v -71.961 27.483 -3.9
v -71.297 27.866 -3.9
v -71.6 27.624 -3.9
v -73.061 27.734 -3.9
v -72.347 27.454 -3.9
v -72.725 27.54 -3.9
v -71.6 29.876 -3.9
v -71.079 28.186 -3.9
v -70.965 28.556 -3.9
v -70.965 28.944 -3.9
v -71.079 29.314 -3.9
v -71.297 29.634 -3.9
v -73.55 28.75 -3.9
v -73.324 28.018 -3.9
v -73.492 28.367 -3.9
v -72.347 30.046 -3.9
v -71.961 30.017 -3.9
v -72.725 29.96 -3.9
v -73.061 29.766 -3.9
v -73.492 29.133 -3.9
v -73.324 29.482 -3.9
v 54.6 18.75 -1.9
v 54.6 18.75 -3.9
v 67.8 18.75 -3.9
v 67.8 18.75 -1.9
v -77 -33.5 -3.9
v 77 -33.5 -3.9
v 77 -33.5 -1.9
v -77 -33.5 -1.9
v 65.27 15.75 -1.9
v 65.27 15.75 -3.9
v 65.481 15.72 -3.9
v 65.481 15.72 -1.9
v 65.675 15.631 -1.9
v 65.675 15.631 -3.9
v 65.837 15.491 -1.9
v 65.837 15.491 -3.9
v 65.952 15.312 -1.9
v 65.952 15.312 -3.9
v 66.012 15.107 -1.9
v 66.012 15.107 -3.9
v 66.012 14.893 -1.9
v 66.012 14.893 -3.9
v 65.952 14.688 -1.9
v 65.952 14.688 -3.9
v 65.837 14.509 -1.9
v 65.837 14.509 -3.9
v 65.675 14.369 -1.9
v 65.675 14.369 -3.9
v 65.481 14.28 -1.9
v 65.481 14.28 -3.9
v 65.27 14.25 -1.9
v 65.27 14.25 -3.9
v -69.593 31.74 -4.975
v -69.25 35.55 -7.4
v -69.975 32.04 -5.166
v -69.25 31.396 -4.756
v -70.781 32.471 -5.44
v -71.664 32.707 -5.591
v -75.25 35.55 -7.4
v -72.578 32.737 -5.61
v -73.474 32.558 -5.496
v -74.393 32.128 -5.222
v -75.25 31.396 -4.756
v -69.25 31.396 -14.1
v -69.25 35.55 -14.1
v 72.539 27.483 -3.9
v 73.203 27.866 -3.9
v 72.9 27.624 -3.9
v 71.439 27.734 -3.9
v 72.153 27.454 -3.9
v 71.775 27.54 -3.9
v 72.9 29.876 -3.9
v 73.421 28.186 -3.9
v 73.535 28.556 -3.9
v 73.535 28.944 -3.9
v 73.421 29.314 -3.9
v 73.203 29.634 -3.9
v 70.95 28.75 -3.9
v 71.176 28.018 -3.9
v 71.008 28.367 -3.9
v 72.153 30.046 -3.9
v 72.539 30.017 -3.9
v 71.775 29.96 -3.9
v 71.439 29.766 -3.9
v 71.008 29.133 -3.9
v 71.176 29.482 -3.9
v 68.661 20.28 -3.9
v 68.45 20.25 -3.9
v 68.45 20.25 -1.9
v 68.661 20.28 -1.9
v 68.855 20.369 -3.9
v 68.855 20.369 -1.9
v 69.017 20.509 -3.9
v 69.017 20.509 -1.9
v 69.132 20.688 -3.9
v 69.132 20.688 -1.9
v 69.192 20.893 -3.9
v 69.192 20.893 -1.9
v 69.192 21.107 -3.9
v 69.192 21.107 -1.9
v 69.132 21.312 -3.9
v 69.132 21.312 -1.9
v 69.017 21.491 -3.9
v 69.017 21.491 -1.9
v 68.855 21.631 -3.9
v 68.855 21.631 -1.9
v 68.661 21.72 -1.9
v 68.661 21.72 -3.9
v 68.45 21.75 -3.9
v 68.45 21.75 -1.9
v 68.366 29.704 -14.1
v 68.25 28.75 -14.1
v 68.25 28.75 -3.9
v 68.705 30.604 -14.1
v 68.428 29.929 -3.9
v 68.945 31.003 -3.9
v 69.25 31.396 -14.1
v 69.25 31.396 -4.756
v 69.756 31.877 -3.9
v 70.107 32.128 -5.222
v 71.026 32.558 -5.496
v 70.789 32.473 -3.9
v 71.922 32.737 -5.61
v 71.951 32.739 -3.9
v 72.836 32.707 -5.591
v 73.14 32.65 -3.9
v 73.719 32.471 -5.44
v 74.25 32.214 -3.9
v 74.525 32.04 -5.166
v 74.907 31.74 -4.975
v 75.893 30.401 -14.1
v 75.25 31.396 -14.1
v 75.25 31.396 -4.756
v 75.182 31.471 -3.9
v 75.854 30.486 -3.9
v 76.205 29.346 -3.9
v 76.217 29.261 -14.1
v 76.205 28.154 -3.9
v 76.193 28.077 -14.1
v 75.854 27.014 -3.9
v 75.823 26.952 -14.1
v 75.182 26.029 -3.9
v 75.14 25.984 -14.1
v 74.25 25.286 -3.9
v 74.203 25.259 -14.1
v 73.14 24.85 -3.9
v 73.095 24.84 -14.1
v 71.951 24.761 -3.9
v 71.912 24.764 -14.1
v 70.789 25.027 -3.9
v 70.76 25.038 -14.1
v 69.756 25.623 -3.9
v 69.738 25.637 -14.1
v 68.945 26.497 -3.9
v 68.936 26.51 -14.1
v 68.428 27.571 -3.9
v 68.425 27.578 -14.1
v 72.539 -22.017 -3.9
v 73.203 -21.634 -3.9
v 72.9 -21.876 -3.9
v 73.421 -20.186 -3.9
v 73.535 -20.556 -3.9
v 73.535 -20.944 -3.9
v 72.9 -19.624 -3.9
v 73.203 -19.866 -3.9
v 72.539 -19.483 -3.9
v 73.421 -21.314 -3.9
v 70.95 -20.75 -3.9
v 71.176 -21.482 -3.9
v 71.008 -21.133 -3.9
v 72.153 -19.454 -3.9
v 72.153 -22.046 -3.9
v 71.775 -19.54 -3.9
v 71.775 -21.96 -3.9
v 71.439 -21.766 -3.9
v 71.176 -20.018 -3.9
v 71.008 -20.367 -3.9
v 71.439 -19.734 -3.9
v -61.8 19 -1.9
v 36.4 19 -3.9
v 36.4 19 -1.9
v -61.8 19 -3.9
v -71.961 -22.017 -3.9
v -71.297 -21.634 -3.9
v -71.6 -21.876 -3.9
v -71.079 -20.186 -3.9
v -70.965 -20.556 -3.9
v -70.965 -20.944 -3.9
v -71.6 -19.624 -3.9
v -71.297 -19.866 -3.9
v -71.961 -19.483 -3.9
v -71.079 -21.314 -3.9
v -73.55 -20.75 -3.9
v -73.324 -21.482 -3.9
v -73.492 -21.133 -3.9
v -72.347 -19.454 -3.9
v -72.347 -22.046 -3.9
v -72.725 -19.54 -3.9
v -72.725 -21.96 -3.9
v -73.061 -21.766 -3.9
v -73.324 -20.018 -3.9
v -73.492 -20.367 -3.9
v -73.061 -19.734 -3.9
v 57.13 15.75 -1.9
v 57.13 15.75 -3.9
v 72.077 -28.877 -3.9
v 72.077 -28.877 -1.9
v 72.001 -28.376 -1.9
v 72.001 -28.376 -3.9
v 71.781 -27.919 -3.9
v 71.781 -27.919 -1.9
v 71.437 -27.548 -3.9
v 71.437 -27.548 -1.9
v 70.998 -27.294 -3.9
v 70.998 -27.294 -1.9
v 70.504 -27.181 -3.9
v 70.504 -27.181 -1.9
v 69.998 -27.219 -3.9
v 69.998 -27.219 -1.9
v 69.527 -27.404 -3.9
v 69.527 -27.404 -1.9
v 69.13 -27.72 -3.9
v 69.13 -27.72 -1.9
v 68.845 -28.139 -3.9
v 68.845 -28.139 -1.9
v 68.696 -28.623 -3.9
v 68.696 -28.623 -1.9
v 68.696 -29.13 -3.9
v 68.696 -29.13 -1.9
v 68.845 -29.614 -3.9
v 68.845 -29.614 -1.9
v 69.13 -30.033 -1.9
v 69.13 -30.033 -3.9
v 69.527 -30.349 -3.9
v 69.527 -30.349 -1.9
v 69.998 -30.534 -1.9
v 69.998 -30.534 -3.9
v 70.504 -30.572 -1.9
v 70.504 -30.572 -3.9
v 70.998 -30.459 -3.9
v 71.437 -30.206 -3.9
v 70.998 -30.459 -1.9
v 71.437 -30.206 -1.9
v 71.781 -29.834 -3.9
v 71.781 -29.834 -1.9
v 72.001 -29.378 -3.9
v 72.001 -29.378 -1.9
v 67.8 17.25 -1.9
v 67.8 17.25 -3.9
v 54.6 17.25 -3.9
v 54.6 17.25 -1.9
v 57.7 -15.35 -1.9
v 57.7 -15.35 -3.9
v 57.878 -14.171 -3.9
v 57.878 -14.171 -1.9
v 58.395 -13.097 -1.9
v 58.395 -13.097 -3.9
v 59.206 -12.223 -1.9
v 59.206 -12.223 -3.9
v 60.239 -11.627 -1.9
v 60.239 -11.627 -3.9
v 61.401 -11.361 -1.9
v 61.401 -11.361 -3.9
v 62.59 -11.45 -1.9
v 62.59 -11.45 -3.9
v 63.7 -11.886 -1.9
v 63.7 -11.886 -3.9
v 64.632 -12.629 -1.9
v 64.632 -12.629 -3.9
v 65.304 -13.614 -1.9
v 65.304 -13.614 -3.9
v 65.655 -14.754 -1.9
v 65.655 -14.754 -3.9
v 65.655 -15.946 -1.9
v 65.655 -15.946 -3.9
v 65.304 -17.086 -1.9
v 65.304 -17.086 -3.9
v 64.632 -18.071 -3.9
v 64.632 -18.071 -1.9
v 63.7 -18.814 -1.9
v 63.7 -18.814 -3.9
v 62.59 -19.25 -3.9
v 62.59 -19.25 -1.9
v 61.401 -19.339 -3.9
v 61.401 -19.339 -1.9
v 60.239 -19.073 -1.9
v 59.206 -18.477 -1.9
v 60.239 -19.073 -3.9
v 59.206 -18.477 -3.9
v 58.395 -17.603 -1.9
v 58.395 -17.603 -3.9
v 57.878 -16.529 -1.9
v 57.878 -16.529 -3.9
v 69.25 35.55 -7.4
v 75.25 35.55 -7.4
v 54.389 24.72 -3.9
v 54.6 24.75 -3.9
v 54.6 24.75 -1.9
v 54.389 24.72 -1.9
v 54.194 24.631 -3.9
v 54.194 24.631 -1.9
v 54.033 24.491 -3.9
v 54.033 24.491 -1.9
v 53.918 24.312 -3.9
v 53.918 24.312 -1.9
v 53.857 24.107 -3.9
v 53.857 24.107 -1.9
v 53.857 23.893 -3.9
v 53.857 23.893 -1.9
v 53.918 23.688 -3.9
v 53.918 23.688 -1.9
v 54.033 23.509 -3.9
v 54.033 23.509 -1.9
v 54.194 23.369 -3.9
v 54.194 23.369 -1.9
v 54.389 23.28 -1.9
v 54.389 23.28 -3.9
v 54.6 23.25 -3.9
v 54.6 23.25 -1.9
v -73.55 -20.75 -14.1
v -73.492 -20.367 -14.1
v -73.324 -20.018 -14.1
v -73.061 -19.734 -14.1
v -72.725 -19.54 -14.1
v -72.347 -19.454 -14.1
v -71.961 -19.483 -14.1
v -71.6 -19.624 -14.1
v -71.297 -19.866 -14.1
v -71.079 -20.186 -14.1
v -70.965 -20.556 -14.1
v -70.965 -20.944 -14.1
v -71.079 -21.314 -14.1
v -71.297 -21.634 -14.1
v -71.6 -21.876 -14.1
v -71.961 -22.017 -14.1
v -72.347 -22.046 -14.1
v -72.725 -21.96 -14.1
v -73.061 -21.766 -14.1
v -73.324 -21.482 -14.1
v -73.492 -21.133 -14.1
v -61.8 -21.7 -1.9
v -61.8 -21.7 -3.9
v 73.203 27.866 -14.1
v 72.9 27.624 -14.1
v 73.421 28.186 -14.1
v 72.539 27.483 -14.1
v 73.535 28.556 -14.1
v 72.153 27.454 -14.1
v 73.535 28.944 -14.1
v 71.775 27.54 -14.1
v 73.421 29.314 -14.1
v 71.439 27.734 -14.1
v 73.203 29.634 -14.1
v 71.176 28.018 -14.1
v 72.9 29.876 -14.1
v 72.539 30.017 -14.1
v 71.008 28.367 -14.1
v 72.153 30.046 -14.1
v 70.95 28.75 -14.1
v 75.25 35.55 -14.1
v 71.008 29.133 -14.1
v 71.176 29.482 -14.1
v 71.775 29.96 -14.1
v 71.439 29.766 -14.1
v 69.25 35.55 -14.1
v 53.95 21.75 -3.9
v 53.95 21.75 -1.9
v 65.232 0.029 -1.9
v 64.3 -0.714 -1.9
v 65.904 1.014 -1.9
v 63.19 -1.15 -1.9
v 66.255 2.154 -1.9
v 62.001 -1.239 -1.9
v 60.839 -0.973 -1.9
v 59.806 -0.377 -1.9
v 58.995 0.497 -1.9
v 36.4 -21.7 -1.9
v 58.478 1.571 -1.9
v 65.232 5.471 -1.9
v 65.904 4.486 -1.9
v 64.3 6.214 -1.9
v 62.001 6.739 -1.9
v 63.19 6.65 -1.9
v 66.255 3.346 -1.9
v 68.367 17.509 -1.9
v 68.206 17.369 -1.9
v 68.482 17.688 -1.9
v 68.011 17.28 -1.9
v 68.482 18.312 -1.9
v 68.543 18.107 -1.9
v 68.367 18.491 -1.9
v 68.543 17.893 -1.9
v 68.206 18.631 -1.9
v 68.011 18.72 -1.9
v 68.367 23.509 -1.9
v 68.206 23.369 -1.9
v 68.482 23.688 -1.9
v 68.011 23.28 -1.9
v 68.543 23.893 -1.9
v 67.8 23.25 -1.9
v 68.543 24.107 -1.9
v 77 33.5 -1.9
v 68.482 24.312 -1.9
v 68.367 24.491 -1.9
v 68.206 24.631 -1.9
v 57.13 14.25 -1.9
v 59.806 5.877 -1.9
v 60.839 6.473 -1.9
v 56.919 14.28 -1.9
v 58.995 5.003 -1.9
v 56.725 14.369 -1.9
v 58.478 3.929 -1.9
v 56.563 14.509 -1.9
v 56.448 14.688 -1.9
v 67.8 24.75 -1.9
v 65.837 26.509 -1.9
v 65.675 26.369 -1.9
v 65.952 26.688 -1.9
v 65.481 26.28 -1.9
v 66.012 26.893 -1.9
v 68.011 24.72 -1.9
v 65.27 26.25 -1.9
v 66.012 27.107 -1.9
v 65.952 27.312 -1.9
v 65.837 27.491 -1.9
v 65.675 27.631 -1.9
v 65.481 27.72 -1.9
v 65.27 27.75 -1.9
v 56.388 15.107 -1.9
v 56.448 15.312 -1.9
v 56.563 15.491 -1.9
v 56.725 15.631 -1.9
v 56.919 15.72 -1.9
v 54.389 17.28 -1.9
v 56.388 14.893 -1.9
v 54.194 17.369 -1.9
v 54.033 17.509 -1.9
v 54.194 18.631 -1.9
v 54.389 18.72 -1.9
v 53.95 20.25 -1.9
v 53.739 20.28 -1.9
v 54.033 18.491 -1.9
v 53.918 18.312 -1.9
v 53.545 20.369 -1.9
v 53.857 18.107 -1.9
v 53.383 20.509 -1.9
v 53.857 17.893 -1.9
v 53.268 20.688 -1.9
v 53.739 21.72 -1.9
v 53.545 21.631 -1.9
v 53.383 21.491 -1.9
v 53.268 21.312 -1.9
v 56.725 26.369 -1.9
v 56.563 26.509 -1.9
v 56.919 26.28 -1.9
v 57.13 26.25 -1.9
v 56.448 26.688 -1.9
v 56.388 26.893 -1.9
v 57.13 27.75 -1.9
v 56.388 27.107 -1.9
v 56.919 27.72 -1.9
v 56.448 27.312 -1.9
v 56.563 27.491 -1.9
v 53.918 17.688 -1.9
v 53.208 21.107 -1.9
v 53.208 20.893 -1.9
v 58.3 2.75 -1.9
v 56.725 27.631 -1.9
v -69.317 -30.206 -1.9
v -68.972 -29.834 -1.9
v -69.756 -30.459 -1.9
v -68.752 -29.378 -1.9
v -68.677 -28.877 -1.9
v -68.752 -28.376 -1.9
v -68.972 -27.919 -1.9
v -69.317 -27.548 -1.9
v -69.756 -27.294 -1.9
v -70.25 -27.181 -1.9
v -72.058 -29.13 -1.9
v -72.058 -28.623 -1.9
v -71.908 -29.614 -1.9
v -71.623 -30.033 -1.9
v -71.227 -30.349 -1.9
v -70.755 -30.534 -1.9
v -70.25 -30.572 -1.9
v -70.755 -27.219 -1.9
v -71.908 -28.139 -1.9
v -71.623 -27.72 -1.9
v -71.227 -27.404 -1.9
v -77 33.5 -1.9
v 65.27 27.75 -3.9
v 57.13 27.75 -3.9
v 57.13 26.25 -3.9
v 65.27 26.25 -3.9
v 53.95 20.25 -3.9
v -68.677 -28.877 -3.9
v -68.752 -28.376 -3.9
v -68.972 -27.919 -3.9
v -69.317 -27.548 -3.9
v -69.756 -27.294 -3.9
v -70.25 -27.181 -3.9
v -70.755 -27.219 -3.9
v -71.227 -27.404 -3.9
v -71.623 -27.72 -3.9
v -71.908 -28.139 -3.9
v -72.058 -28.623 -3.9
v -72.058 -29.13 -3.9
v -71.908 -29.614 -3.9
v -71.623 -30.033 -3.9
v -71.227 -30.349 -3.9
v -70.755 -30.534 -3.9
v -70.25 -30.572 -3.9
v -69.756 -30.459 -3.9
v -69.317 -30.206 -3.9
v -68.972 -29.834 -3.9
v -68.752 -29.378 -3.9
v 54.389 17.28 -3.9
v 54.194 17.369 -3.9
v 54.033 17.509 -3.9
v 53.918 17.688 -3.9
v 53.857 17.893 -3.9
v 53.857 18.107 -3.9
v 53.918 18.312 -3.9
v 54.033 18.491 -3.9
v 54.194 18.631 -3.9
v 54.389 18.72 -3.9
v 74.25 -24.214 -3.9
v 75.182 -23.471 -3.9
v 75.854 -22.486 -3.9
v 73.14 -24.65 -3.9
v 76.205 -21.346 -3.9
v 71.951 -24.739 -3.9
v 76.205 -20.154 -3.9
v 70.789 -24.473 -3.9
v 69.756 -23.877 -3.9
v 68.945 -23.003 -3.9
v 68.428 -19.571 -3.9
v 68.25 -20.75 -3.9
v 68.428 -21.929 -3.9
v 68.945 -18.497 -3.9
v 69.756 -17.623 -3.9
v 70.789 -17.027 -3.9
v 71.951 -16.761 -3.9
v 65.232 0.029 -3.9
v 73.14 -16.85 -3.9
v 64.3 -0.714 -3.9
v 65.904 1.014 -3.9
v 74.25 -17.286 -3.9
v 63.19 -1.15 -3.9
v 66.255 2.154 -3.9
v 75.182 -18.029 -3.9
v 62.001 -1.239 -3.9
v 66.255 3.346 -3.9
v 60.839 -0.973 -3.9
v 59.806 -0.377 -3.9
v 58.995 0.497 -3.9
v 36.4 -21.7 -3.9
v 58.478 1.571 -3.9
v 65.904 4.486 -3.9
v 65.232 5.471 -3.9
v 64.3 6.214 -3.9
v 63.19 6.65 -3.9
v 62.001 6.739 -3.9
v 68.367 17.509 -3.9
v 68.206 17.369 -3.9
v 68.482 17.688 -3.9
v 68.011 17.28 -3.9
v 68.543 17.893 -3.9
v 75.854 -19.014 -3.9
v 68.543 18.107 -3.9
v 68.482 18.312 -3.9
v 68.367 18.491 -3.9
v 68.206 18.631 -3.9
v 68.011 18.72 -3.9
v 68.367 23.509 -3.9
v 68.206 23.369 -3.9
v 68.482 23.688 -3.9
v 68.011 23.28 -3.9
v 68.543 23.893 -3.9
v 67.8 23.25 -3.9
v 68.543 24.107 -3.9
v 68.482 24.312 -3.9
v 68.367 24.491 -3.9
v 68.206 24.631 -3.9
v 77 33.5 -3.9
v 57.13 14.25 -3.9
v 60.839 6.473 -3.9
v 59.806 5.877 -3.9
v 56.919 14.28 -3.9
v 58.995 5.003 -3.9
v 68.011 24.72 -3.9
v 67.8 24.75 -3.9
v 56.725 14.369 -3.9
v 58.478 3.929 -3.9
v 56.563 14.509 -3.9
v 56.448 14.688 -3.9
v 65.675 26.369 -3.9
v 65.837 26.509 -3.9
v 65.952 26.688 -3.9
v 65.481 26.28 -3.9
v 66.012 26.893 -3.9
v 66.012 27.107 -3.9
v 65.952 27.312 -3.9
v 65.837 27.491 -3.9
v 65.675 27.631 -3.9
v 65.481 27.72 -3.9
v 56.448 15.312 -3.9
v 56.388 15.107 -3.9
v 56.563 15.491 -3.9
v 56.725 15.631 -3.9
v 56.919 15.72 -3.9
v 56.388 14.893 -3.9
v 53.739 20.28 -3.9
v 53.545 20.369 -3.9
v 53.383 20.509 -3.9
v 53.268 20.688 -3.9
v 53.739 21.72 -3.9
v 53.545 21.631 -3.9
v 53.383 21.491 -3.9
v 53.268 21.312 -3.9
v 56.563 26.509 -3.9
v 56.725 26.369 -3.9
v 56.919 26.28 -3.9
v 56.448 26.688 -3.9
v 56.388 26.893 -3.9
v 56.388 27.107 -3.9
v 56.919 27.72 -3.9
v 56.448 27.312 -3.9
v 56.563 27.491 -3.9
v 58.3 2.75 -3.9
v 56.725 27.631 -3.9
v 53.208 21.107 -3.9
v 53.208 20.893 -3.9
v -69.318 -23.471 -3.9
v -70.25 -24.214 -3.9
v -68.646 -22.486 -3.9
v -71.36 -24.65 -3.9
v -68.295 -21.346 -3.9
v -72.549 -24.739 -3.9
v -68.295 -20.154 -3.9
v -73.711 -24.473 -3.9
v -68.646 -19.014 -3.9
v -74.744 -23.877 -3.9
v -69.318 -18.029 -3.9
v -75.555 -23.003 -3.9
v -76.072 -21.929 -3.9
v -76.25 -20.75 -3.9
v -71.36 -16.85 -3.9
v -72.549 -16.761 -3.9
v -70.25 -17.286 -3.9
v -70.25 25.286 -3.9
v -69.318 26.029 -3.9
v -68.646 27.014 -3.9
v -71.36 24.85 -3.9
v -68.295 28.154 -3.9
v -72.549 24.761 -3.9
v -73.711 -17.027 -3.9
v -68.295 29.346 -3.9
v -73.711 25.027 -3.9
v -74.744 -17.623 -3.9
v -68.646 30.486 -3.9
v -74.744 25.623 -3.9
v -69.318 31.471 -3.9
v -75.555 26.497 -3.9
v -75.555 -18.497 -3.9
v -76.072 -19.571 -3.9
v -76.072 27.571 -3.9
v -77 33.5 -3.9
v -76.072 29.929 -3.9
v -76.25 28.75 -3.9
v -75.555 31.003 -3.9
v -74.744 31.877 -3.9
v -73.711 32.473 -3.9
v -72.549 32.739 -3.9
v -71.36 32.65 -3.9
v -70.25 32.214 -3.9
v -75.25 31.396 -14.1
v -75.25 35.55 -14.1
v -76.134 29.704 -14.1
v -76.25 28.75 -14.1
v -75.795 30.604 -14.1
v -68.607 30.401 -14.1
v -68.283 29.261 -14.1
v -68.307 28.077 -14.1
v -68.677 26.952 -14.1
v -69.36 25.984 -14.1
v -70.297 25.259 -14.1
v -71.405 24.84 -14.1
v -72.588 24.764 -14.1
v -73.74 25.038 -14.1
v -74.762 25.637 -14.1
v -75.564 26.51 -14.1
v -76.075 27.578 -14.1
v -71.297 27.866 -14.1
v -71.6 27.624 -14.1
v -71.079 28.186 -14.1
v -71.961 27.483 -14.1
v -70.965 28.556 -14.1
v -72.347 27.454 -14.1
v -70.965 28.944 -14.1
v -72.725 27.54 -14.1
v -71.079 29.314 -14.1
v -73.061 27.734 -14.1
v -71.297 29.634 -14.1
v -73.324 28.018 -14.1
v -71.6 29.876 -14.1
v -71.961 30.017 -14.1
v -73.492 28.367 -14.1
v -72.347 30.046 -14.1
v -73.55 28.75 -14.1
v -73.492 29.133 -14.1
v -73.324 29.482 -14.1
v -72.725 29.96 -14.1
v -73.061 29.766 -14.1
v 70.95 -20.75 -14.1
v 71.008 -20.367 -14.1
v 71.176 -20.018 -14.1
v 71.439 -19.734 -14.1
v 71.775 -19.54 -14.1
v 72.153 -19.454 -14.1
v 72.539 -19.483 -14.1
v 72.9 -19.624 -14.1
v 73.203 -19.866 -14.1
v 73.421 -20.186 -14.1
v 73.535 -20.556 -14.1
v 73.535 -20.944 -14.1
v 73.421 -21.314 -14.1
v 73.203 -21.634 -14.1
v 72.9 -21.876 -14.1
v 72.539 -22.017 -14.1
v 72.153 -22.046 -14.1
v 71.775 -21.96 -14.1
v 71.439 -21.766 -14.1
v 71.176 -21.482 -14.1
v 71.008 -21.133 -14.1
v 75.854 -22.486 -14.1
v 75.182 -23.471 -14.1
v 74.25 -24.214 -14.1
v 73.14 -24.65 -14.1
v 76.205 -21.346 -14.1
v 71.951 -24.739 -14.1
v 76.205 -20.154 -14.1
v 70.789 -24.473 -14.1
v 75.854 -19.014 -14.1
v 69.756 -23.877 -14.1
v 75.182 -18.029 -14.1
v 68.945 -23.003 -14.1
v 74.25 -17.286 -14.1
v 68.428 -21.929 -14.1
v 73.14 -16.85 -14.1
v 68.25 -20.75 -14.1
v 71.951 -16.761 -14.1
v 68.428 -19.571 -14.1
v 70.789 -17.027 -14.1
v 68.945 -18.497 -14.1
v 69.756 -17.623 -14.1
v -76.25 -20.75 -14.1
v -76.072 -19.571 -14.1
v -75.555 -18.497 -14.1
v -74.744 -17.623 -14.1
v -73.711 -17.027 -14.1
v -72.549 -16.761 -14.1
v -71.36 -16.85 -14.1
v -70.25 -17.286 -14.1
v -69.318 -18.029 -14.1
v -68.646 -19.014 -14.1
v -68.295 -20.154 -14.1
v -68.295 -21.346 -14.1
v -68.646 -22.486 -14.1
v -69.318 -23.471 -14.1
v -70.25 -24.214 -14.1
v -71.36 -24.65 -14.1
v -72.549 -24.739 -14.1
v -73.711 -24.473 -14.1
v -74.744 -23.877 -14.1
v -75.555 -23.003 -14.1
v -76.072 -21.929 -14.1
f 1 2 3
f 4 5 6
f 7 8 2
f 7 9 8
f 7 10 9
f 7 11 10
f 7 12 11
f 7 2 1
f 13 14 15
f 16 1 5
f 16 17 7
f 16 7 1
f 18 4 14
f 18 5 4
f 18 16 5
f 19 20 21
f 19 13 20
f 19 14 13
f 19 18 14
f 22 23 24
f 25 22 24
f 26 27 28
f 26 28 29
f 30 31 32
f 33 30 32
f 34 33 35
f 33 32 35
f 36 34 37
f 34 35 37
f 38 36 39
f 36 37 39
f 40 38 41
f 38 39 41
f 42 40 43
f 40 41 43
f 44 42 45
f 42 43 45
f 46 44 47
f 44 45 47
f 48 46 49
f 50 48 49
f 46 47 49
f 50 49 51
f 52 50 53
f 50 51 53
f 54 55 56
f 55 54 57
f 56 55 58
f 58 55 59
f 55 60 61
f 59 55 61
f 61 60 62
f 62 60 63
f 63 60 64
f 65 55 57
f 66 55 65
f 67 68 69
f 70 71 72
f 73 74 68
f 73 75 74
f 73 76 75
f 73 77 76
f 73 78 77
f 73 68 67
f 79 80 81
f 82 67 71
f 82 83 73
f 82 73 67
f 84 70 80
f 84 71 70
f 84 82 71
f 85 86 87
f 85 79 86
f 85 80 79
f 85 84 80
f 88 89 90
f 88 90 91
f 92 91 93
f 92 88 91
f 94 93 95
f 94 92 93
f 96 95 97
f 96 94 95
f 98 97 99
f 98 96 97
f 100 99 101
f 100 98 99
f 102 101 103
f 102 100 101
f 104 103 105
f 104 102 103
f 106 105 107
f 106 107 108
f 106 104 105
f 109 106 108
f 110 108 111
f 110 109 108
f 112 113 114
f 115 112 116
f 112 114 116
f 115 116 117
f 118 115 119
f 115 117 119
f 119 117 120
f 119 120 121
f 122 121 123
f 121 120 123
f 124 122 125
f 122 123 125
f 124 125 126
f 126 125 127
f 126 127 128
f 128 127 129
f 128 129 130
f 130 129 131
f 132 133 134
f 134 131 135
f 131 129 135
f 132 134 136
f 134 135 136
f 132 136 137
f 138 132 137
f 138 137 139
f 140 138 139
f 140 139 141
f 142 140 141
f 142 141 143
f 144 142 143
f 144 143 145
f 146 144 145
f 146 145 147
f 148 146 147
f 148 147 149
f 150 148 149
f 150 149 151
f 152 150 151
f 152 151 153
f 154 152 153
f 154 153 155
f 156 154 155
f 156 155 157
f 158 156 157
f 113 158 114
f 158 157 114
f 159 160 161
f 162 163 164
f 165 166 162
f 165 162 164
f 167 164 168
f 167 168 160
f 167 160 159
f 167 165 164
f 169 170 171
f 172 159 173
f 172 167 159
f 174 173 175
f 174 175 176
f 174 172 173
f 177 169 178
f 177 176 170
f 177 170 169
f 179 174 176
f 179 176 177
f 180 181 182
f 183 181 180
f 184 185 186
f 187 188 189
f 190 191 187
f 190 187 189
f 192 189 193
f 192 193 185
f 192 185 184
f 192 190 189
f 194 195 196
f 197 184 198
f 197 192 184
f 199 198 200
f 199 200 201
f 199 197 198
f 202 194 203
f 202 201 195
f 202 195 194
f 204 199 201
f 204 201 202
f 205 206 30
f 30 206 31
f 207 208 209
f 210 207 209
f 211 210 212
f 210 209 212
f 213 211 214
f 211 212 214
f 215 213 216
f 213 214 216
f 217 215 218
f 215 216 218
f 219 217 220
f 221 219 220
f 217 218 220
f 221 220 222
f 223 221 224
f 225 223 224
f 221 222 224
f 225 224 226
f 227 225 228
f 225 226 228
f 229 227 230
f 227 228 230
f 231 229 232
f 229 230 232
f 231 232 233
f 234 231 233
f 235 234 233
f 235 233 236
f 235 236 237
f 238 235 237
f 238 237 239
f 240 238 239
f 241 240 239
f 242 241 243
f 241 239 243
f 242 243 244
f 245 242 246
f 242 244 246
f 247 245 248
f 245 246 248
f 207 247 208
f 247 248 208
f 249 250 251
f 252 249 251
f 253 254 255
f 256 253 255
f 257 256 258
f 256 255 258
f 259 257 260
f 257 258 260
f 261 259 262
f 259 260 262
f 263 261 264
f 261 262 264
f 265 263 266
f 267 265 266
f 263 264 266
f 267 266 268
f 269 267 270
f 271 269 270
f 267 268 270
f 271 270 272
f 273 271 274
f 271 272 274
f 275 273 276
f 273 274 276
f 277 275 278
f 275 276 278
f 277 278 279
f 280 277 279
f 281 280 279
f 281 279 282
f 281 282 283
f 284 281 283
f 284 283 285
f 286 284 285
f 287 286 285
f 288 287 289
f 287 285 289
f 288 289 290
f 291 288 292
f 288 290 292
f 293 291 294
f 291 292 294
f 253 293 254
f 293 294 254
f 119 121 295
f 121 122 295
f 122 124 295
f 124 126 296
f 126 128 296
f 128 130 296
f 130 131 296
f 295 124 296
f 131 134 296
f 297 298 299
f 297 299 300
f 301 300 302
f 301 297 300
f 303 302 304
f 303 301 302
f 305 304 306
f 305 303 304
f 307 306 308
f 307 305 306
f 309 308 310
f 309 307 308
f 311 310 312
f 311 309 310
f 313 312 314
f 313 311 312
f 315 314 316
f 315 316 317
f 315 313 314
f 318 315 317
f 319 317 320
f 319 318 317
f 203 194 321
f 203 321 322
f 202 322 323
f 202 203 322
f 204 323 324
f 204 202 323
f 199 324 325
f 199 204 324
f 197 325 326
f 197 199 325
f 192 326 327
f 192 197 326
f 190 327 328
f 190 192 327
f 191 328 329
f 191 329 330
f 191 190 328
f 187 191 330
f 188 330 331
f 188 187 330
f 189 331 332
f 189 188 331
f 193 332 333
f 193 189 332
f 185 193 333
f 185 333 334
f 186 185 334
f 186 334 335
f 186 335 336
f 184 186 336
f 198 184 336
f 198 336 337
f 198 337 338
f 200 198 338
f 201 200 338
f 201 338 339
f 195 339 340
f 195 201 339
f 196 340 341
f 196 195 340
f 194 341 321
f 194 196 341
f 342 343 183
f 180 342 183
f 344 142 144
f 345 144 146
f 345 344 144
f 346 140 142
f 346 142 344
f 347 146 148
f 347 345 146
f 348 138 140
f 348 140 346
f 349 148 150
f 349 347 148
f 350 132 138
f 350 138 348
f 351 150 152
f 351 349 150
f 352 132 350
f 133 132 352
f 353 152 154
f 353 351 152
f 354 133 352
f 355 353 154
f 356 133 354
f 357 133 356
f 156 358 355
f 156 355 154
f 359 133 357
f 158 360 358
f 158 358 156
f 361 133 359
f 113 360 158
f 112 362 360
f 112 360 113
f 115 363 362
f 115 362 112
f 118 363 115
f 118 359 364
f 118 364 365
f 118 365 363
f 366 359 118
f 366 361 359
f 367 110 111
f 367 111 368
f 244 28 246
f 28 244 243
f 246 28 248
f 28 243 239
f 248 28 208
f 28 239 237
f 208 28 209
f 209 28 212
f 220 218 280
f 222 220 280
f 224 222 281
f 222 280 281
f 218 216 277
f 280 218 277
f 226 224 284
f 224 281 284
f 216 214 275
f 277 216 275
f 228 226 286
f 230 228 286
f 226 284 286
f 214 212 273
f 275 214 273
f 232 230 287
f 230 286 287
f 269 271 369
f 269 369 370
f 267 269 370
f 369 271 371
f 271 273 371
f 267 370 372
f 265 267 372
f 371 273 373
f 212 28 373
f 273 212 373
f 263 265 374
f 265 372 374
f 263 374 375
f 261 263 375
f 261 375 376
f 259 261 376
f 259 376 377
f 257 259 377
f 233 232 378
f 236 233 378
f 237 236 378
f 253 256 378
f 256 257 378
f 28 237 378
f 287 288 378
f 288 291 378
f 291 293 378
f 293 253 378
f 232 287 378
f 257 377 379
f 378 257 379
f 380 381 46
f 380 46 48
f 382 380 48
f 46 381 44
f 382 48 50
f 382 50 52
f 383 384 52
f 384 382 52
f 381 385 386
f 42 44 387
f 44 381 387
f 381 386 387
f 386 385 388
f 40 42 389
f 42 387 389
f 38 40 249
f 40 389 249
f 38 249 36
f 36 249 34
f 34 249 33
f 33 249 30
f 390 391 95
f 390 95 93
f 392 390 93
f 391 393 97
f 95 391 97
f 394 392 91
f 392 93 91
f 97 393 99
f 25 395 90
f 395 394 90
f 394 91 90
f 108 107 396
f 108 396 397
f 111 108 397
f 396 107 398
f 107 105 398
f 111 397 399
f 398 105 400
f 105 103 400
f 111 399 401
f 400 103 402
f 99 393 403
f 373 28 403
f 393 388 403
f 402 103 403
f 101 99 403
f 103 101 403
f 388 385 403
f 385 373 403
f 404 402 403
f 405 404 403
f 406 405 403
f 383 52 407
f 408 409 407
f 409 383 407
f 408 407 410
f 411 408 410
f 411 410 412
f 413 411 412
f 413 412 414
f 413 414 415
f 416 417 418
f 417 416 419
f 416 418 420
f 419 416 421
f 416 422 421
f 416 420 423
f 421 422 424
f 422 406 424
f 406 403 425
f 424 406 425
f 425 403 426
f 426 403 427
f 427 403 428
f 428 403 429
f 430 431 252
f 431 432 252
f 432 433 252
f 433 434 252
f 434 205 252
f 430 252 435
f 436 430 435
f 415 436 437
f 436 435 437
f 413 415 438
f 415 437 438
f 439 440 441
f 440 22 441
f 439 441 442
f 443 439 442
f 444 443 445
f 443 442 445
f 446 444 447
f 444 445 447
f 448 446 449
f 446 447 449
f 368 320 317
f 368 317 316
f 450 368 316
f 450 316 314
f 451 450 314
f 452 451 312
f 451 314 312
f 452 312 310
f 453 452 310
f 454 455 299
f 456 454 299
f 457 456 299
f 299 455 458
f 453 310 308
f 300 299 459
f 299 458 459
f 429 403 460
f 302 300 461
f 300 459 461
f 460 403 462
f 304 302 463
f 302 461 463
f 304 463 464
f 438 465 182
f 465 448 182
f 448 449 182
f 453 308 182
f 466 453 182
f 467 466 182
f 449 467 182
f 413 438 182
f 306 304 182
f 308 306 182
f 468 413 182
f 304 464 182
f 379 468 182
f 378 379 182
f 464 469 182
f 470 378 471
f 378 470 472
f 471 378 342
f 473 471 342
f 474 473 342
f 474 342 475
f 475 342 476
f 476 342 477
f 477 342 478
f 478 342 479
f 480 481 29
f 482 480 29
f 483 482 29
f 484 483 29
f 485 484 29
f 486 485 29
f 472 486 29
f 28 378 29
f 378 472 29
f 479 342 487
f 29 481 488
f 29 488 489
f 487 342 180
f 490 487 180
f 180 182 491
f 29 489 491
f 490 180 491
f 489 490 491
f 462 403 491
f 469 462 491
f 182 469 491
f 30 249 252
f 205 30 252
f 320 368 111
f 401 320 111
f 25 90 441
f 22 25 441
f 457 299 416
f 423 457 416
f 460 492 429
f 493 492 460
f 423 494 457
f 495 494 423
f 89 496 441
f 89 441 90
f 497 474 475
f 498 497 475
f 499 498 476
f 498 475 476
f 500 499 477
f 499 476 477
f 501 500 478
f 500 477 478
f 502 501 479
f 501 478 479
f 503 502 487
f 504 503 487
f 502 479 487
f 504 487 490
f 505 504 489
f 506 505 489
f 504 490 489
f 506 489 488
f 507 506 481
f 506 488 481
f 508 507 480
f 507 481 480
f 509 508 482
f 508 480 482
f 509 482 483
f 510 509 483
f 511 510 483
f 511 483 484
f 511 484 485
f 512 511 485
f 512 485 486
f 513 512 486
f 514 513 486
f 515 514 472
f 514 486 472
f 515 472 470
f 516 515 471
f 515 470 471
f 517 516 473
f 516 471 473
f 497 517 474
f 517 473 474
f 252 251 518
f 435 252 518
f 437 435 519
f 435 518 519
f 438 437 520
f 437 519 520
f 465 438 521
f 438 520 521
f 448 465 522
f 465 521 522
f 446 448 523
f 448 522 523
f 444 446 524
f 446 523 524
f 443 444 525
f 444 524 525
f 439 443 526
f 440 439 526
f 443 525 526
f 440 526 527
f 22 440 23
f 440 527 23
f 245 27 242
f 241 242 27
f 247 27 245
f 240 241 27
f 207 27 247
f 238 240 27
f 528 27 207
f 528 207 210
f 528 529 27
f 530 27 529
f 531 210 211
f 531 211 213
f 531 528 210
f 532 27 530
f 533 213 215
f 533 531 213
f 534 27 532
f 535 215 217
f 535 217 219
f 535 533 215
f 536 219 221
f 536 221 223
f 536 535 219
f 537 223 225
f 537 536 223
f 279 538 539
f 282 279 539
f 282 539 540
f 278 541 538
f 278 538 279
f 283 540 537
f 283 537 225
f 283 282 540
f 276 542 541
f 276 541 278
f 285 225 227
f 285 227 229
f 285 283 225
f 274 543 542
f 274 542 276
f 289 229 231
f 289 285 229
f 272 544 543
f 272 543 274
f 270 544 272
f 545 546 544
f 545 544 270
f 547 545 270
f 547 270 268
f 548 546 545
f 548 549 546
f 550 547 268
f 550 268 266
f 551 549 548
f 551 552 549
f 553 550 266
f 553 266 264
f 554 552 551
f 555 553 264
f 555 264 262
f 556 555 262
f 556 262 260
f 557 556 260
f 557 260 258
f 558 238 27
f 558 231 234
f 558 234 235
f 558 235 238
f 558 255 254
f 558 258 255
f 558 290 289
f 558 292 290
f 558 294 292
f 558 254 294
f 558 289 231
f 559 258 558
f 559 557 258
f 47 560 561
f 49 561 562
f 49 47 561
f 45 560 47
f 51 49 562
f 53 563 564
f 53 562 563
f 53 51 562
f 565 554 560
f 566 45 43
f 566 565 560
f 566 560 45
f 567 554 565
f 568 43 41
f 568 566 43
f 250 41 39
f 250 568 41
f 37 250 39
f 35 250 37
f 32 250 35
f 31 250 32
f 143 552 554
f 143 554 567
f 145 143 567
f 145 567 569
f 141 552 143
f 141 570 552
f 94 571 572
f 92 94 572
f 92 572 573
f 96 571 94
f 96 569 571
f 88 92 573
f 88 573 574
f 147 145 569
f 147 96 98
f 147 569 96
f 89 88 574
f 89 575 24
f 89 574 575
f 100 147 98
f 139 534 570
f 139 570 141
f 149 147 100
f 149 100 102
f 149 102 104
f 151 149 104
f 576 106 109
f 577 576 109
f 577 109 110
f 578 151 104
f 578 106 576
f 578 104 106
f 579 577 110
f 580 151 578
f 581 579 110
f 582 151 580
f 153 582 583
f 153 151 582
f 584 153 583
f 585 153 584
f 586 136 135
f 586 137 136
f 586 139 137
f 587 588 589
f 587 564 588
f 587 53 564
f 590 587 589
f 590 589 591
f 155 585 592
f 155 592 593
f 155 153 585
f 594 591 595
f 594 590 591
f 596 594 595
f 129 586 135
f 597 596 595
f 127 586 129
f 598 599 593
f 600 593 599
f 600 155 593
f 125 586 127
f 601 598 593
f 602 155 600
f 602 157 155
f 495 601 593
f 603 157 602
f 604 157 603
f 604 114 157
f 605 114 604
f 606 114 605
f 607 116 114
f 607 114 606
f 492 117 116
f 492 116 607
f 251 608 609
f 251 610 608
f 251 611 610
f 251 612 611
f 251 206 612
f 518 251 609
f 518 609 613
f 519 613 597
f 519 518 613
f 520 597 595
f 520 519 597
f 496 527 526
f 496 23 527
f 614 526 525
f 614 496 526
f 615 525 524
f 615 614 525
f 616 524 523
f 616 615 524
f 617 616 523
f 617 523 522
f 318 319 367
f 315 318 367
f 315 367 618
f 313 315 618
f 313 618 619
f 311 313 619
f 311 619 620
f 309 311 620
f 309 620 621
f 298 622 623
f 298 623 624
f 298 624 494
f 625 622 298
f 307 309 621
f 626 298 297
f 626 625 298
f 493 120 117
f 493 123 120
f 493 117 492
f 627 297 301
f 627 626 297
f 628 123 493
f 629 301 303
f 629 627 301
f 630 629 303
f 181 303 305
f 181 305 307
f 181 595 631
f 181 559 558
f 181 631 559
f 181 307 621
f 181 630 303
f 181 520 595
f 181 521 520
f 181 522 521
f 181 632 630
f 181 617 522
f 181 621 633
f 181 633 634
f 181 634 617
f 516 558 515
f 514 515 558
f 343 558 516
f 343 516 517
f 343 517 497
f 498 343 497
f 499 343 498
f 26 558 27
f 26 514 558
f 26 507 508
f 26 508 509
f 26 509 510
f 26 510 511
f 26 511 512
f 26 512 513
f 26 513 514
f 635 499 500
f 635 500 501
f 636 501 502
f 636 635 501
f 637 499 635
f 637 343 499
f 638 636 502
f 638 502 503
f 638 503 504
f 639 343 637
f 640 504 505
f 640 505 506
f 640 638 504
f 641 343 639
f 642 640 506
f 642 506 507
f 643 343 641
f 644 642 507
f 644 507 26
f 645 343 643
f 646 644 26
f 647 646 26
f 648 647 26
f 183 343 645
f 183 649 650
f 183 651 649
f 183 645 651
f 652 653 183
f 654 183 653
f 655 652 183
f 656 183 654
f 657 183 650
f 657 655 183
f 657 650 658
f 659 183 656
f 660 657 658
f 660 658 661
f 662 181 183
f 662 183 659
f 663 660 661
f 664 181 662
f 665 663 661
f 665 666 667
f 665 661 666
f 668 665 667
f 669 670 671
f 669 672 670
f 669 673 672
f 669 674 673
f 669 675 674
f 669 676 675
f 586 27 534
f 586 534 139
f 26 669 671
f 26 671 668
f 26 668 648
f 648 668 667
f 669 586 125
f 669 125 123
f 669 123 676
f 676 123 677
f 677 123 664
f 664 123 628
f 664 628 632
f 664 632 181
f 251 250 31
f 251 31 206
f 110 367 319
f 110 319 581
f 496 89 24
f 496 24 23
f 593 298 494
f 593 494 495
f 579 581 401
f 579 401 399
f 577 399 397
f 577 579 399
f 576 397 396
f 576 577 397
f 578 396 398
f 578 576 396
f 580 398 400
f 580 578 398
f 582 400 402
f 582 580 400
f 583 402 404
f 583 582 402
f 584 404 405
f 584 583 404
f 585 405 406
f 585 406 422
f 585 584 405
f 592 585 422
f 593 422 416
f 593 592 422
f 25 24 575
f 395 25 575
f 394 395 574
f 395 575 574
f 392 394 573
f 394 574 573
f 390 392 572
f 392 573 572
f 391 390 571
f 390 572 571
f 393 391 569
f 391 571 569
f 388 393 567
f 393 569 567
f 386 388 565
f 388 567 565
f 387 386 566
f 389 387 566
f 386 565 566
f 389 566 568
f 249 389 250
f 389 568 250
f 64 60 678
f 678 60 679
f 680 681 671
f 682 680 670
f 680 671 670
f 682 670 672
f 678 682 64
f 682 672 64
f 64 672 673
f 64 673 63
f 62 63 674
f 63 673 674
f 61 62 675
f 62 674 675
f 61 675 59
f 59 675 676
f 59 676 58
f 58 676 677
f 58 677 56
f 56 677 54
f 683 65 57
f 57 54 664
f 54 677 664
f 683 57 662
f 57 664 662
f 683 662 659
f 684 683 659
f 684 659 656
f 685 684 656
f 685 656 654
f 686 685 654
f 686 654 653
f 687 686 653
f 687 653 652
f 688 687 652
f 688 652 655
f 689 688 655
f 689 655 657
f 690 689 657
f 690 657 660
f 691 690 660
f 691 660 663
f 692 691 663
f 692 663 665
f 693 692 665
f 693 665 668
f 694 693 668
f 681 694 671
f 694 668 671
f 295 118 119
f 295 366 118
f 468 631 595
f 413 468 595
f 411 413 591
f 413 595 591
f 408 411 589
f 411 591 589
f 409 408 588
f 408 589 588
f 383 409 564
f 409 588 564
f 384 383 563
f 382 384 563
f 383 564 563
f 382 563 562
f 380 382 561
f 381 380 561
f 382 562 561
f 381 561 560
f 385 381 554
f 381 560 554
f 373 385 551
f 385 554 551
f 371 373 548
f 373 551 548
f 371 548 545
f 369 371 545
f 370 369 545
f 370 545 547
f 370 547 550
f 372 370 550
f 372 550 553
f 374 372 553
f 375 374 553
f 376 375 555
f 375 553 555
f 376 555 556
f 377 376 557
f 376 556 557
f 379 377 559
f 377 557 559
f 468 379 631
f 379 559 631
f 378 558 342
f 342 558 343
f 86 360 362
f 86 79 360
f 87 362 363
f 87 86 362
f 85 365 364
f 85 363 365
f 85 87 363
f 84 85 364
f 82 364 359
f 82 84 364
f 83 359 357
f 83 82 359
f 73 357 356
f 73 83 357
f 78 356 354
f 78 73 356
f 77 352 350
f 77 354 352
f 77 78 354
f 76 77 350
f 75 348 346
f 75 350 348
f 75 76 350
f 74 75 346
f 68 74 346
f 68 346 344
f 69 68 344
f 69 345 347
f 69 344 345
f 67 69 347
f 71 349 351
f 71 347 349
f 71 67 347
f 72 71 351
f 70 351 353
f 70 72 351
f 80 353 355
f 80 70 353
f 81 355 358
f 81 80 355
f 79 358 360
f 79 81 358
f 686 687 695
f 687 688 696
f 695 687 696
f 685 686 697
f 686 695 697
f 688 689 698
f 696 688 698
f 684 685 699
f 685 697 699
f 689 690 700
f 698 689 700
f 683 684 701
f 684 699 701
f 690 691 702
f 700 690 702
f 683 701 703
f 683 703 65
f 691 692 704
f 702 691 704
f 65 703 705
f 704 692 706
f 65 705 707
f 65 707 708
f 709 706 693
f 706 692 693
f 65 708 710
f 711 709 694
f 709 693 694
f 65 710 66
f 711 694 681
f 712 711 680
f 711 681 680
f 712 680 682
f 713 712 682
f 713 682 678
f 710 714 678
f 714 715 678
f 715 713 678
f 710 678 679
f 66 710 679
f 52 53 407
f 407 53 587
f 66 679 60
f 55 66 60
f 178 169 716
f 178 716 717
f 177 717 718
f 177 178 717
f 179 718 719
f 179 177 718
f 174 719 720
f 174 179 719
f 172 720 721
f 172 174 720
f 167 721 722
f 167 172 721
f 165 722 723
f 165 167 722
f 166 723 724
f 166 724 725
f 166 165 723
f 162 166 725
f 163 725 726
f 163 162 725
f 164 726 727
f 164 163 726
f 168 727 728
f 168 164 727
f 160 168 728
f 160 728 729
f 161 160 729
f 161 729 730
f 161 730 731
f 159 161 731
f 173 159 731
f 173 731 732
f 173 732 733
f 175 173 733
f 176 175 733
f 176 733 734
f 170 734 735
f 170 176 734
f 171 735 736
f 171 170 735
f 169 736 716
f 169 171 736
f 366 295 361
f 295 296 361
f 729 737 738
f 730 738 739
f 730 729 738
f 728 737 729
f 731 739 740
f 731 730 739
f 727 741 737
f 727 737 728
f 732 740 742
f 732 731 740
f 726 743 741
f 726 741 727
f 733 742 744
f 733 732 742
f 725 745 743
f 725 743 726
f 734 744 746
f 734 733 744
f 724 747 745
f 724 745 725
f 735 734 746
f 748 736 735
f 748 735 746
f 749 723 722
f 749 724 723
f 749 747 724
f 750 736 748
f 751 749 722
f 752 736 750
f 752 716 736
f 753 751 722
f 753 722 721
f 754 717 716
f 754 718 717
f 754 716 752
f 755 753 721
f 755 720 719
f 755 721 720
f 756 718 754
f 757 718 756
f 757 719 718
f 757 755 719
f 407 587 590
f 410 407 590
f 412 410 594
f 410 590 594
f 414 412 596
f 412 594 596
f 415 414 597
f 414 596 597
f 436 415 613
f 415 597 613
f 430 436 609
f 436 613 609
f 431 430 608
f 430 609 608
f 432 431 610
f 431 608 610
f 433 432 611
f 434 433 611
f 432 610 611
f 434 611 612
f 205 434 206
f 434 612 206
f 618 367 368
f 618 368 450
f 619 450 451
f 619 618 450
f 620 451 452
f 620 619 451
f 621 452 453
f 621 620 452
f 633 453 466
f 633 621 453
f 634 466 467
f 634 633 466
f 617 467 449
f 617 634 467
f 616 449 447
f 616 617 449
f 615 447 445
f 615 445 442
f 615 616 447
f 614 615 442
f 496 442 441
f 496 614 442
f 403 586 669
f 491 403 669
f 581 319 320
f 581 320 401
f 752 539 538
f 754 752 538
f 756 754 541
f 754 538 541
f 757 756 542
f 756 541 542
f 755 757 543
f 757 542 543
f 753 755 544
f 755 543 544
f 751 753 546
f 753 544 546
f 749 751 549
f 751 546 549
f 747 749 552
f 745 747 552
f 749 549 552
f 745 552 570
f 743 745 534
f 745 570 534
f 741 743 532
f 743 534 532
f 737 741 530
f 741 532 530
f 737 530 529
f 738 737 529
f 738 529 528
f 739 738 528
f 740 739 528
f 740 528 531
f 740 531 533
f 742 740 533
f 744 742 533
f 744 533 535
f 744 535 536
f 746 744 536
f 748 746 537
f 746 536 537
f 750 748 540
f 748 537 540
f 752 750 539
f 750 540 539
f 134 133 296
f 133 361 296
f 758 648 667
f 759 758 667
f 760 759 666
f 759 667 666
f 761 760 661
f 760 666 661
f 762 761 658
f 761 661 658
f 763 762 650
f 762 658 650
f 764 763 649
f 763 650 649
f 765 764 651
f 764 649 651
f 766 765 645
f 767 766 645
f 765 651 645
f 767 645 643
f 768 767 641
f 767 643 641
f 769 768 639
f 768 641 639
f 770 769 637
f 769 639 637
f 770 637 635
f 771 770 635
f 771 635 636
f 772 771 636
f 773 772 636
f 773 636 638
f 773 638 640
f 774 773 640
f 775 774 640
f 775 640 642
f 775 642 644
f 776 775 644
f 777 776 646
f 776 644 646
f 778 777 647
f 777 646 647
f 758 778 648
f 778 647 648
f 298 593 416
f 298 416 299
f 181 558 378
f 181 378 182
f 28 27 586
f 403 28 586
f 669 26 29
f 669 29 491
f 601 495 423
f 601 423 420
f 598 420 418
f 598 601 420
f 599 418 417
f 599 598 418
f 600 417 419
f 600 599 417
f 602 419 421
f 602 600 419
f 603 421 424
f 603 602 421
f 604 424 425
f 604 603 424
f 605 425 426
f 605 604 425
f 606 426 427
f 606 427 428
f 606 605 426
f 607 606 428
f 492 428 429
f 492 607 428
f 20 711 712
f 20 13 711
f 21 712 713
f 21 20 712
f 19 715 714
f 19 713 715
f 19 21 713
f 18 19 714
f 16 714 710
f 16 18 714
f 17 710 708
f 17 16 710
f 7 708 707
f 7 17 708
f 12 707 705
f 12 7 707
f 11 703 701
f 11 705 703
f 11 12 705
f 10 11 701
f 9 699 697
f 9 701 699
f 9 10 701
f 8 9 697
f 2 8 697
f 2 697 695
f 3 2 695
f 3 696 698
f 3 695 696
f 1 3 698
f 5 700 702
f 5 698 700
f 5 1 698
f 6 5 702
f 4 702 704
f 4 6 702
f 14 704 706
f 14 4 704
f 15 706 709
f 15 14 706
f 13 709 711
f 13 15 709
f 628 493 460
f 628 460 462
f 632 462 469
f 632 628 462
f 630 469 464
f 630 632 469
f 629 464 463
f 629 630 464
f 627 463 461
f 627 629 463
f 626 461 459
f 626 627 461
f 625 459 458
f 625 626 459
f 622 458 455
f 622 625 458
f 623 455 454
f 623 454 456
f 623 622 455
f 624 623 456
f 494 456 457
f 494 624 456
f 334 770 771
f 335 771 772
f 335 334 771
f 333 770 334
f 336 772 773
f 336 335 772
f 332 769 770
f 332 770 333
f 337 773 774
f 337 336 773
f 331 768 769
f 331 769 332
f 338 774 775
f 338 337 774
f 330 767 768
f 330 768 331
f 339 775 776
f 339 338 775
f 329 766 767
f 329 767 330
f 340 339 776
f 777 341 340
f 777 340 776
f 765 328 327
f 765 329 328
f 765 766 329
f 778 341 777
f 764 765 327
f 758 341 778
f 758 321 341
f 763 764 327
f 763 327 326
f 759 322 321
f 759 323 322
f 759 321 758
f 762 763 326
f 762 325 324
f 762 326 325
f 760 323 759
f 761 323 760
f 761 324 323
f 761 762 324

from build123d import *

# Parameters (mm, degrees)
SKETCH1_W           = 154
SKETCH1_H           = 67
SKETCH1_R           = 4
SKETCH1_W_2         = 98.2
SKETCH1_H_2         = 40.7
BOSS_EXTRUDE1_DEPTH = 2
SKETCH2_R           = 4
SKETCH2_R_2         = 1.3
BOSS_EXTRUDE2_DEPTH = 10.2
BOSS_EXTRUDE3_DEPTH = 3
BOSS_EXTRUDE4_DEPTH = 3
SKETCH4_R           = 1.7
CUT_EXTRUDE1_DEPTH  = 2


with BuildPart() as part:
    # Sketch1 → Boss-Extrude1 (new body)
    with BuildSketch(Plane(origin=(0, 0, -3.9), x_dir=(-1, 0, 0), z_dir=(0, 0, -1))):
        Rectangle(SKETCH1_W, SKETCH1_H)
        with Locations((-61.7, -15.35)):
            Circle(SKETCH1_R, mode=Mode.SUBTRACT)
        with Locations((-62.3, 2.75)):
            Circle(SKETCH1_R, mode=Mode.SUBTRACT)
        with BuildLine():
            Line((-57.130294851, 15.75), (-65.269705149, 15.75))
            ThreePointArc((-65.269705149, 15.75), (-66.019705149, 15), (-65.269705149, 14.25))
            Line((-65.269705149, 14.25), (-57.130294851, 14.25))
            ThreePointArc((-57.130294851, 14.25), (-56.380294851, 15), (-57.130294851, 15.75))
        make_face(mode=Mode.SUBTRACT)
        with BuildLine():
            Line((-65.269705149, 27.75), (-57.130294851, 27.75))
            ThreePointArc((-57.130294851, 27.75), (-56.380294851, 27), (-57.130294851, 26.25))
            Line((-57.130294851, 26.25), (-65.269705149, 26.25))
            ThreePointArc((-65.269705149, 26.25), (-66.019705149, 27), (-65.269705149, 27.75))
        make_face(mode=Mode.SUBTRACT)
        with BuildLine():
            Line((-68.45, 21.75), (-53.95, 21.75))
            ThreePointArc((-53.95, 21.75), (-53.2, 21), (-53.95, 20.25))
            Line((-53.95, 20.25), (-68.45, 20.25))
            ThreePointArc((-68.45, 20.25), (-69.2, 21), (-68.45, 21.75))
        make_face(mode=Mode.SUBTRACT)
        with BuildLine():
            Line((-54.599810609, 18.75), (-67.800189391, 18.75))
            ThreePointArc((-67.800189391, 18.75), (-68.550189391, 18), (-67.800189391, 17.25))
            Line((-67.800189391, 17.25), (-54.599810609, 17.25))
            ThreePointArc((-54.599810609, 17.25), (-53.849810609, 18), (-54.599810609, 18.75))
        make_face(mode=Mode.SUBTRACT)
        with BuildLine():
            Line((-54.599810609, 23.25), (-67.800189391, 23.25))
            ThreePointArc((-67.800189391, 23.25), (-68.550189391, 24), (-67.800189391, 24.75))
            Line((-67.800189391, 24.75), (-54.599810609, 24.75))
            ThreePointArc((-54.599810609, 24.75), (-53.849810609, 24), (-54.599810609, 23.25))
        make_face(mode=Mode.SUBTRACT)
        with Locations((12.7, -1.35)):
            Rectangle(SKETCH1_W_2, SKETCH1_H_2, mode=Mode.SUBTRACT)
    extrude(amount=-BOSS_EXTRUDE1_DEPTH)

    # Sketch2 → Boss-Extrude2 (add)
    with BuildSketch(Plane(origin=(0, 0, -3.9), x_dir=(-1, 0, 0), z_dir=(0, 0, -1))):
        with Locations((-72.25, 28.75)):
            Circle(SKETCH2_R)
        with Locations((-72.25, 28.75)):
            Circle(SKETCH2_R_2, mode=Mode.SUBTRACT)
        with Locations((-72.25, -20.75)):
            Circle(SKETCH2_R)
        with Locations((-72.25, -20.75)):
            Circle(SKETCH2_R_2, mode=Mode.SUBTRACT)
        with Locations((72.25, -20.75)):
            Circle(SKETCH2_R)
        with Locations((72.25, -20.75)):
            Circle(SKETCH2_R_2, mode=Mode.SUBTRACT)
        with Locations((72.25, 28.75)):
            Circle(SKETCH2_R)
        with Locations((72.25, 28.75)):
            Circle(SKETCH2_R_2, mode=Mode.SUBTRACT)
    extrude(amount=BOSS_EXTRUDE2_DEPTH)

    # Sketch3 → Boss-Extrude3 (add, symmetric)
    with BuildSketch(Plane.ZY.offset(72.25)):
        Polygon((-7.4, 35.55), (-3.9, 30.05), (-14.1, 30.05), (-14.1, 35.55), align=None)
    extrude(amount=BOSS_EXTRUDE3_DEPTH, both=True)

    # Sketch5 → Boss-Extrude4 (add, symmetric)
    with BuildSketch(Plane(origin=(72.25, 0, 0), x_dir=(0, 0, -1), z_dir=(1, 0, 0))):
        Polygon((3.9, 30.05), (7.4, 35.55), (14.1, 35.55), (14.1, 30.05), align=None)
    extrude(amount=BOSS_EXTRUDE4_DEPTH, both=True)

    # Sketch4 → Cut-Extrude1 (cut)
    with BuildSketch(Plane.XY.offset(-1.9)):
        with Locations((-70.376631043, -28.876631043)):
            Circle(SKETCH4_R)
        with Locations((70.376631043, -28.876631043)):
            Circle(SKETCH4_R)
    extrude(amount=-CUT_EXTRUDE1_DEPTH, mode=Mode.SUBTRACT)


solid = part.part
